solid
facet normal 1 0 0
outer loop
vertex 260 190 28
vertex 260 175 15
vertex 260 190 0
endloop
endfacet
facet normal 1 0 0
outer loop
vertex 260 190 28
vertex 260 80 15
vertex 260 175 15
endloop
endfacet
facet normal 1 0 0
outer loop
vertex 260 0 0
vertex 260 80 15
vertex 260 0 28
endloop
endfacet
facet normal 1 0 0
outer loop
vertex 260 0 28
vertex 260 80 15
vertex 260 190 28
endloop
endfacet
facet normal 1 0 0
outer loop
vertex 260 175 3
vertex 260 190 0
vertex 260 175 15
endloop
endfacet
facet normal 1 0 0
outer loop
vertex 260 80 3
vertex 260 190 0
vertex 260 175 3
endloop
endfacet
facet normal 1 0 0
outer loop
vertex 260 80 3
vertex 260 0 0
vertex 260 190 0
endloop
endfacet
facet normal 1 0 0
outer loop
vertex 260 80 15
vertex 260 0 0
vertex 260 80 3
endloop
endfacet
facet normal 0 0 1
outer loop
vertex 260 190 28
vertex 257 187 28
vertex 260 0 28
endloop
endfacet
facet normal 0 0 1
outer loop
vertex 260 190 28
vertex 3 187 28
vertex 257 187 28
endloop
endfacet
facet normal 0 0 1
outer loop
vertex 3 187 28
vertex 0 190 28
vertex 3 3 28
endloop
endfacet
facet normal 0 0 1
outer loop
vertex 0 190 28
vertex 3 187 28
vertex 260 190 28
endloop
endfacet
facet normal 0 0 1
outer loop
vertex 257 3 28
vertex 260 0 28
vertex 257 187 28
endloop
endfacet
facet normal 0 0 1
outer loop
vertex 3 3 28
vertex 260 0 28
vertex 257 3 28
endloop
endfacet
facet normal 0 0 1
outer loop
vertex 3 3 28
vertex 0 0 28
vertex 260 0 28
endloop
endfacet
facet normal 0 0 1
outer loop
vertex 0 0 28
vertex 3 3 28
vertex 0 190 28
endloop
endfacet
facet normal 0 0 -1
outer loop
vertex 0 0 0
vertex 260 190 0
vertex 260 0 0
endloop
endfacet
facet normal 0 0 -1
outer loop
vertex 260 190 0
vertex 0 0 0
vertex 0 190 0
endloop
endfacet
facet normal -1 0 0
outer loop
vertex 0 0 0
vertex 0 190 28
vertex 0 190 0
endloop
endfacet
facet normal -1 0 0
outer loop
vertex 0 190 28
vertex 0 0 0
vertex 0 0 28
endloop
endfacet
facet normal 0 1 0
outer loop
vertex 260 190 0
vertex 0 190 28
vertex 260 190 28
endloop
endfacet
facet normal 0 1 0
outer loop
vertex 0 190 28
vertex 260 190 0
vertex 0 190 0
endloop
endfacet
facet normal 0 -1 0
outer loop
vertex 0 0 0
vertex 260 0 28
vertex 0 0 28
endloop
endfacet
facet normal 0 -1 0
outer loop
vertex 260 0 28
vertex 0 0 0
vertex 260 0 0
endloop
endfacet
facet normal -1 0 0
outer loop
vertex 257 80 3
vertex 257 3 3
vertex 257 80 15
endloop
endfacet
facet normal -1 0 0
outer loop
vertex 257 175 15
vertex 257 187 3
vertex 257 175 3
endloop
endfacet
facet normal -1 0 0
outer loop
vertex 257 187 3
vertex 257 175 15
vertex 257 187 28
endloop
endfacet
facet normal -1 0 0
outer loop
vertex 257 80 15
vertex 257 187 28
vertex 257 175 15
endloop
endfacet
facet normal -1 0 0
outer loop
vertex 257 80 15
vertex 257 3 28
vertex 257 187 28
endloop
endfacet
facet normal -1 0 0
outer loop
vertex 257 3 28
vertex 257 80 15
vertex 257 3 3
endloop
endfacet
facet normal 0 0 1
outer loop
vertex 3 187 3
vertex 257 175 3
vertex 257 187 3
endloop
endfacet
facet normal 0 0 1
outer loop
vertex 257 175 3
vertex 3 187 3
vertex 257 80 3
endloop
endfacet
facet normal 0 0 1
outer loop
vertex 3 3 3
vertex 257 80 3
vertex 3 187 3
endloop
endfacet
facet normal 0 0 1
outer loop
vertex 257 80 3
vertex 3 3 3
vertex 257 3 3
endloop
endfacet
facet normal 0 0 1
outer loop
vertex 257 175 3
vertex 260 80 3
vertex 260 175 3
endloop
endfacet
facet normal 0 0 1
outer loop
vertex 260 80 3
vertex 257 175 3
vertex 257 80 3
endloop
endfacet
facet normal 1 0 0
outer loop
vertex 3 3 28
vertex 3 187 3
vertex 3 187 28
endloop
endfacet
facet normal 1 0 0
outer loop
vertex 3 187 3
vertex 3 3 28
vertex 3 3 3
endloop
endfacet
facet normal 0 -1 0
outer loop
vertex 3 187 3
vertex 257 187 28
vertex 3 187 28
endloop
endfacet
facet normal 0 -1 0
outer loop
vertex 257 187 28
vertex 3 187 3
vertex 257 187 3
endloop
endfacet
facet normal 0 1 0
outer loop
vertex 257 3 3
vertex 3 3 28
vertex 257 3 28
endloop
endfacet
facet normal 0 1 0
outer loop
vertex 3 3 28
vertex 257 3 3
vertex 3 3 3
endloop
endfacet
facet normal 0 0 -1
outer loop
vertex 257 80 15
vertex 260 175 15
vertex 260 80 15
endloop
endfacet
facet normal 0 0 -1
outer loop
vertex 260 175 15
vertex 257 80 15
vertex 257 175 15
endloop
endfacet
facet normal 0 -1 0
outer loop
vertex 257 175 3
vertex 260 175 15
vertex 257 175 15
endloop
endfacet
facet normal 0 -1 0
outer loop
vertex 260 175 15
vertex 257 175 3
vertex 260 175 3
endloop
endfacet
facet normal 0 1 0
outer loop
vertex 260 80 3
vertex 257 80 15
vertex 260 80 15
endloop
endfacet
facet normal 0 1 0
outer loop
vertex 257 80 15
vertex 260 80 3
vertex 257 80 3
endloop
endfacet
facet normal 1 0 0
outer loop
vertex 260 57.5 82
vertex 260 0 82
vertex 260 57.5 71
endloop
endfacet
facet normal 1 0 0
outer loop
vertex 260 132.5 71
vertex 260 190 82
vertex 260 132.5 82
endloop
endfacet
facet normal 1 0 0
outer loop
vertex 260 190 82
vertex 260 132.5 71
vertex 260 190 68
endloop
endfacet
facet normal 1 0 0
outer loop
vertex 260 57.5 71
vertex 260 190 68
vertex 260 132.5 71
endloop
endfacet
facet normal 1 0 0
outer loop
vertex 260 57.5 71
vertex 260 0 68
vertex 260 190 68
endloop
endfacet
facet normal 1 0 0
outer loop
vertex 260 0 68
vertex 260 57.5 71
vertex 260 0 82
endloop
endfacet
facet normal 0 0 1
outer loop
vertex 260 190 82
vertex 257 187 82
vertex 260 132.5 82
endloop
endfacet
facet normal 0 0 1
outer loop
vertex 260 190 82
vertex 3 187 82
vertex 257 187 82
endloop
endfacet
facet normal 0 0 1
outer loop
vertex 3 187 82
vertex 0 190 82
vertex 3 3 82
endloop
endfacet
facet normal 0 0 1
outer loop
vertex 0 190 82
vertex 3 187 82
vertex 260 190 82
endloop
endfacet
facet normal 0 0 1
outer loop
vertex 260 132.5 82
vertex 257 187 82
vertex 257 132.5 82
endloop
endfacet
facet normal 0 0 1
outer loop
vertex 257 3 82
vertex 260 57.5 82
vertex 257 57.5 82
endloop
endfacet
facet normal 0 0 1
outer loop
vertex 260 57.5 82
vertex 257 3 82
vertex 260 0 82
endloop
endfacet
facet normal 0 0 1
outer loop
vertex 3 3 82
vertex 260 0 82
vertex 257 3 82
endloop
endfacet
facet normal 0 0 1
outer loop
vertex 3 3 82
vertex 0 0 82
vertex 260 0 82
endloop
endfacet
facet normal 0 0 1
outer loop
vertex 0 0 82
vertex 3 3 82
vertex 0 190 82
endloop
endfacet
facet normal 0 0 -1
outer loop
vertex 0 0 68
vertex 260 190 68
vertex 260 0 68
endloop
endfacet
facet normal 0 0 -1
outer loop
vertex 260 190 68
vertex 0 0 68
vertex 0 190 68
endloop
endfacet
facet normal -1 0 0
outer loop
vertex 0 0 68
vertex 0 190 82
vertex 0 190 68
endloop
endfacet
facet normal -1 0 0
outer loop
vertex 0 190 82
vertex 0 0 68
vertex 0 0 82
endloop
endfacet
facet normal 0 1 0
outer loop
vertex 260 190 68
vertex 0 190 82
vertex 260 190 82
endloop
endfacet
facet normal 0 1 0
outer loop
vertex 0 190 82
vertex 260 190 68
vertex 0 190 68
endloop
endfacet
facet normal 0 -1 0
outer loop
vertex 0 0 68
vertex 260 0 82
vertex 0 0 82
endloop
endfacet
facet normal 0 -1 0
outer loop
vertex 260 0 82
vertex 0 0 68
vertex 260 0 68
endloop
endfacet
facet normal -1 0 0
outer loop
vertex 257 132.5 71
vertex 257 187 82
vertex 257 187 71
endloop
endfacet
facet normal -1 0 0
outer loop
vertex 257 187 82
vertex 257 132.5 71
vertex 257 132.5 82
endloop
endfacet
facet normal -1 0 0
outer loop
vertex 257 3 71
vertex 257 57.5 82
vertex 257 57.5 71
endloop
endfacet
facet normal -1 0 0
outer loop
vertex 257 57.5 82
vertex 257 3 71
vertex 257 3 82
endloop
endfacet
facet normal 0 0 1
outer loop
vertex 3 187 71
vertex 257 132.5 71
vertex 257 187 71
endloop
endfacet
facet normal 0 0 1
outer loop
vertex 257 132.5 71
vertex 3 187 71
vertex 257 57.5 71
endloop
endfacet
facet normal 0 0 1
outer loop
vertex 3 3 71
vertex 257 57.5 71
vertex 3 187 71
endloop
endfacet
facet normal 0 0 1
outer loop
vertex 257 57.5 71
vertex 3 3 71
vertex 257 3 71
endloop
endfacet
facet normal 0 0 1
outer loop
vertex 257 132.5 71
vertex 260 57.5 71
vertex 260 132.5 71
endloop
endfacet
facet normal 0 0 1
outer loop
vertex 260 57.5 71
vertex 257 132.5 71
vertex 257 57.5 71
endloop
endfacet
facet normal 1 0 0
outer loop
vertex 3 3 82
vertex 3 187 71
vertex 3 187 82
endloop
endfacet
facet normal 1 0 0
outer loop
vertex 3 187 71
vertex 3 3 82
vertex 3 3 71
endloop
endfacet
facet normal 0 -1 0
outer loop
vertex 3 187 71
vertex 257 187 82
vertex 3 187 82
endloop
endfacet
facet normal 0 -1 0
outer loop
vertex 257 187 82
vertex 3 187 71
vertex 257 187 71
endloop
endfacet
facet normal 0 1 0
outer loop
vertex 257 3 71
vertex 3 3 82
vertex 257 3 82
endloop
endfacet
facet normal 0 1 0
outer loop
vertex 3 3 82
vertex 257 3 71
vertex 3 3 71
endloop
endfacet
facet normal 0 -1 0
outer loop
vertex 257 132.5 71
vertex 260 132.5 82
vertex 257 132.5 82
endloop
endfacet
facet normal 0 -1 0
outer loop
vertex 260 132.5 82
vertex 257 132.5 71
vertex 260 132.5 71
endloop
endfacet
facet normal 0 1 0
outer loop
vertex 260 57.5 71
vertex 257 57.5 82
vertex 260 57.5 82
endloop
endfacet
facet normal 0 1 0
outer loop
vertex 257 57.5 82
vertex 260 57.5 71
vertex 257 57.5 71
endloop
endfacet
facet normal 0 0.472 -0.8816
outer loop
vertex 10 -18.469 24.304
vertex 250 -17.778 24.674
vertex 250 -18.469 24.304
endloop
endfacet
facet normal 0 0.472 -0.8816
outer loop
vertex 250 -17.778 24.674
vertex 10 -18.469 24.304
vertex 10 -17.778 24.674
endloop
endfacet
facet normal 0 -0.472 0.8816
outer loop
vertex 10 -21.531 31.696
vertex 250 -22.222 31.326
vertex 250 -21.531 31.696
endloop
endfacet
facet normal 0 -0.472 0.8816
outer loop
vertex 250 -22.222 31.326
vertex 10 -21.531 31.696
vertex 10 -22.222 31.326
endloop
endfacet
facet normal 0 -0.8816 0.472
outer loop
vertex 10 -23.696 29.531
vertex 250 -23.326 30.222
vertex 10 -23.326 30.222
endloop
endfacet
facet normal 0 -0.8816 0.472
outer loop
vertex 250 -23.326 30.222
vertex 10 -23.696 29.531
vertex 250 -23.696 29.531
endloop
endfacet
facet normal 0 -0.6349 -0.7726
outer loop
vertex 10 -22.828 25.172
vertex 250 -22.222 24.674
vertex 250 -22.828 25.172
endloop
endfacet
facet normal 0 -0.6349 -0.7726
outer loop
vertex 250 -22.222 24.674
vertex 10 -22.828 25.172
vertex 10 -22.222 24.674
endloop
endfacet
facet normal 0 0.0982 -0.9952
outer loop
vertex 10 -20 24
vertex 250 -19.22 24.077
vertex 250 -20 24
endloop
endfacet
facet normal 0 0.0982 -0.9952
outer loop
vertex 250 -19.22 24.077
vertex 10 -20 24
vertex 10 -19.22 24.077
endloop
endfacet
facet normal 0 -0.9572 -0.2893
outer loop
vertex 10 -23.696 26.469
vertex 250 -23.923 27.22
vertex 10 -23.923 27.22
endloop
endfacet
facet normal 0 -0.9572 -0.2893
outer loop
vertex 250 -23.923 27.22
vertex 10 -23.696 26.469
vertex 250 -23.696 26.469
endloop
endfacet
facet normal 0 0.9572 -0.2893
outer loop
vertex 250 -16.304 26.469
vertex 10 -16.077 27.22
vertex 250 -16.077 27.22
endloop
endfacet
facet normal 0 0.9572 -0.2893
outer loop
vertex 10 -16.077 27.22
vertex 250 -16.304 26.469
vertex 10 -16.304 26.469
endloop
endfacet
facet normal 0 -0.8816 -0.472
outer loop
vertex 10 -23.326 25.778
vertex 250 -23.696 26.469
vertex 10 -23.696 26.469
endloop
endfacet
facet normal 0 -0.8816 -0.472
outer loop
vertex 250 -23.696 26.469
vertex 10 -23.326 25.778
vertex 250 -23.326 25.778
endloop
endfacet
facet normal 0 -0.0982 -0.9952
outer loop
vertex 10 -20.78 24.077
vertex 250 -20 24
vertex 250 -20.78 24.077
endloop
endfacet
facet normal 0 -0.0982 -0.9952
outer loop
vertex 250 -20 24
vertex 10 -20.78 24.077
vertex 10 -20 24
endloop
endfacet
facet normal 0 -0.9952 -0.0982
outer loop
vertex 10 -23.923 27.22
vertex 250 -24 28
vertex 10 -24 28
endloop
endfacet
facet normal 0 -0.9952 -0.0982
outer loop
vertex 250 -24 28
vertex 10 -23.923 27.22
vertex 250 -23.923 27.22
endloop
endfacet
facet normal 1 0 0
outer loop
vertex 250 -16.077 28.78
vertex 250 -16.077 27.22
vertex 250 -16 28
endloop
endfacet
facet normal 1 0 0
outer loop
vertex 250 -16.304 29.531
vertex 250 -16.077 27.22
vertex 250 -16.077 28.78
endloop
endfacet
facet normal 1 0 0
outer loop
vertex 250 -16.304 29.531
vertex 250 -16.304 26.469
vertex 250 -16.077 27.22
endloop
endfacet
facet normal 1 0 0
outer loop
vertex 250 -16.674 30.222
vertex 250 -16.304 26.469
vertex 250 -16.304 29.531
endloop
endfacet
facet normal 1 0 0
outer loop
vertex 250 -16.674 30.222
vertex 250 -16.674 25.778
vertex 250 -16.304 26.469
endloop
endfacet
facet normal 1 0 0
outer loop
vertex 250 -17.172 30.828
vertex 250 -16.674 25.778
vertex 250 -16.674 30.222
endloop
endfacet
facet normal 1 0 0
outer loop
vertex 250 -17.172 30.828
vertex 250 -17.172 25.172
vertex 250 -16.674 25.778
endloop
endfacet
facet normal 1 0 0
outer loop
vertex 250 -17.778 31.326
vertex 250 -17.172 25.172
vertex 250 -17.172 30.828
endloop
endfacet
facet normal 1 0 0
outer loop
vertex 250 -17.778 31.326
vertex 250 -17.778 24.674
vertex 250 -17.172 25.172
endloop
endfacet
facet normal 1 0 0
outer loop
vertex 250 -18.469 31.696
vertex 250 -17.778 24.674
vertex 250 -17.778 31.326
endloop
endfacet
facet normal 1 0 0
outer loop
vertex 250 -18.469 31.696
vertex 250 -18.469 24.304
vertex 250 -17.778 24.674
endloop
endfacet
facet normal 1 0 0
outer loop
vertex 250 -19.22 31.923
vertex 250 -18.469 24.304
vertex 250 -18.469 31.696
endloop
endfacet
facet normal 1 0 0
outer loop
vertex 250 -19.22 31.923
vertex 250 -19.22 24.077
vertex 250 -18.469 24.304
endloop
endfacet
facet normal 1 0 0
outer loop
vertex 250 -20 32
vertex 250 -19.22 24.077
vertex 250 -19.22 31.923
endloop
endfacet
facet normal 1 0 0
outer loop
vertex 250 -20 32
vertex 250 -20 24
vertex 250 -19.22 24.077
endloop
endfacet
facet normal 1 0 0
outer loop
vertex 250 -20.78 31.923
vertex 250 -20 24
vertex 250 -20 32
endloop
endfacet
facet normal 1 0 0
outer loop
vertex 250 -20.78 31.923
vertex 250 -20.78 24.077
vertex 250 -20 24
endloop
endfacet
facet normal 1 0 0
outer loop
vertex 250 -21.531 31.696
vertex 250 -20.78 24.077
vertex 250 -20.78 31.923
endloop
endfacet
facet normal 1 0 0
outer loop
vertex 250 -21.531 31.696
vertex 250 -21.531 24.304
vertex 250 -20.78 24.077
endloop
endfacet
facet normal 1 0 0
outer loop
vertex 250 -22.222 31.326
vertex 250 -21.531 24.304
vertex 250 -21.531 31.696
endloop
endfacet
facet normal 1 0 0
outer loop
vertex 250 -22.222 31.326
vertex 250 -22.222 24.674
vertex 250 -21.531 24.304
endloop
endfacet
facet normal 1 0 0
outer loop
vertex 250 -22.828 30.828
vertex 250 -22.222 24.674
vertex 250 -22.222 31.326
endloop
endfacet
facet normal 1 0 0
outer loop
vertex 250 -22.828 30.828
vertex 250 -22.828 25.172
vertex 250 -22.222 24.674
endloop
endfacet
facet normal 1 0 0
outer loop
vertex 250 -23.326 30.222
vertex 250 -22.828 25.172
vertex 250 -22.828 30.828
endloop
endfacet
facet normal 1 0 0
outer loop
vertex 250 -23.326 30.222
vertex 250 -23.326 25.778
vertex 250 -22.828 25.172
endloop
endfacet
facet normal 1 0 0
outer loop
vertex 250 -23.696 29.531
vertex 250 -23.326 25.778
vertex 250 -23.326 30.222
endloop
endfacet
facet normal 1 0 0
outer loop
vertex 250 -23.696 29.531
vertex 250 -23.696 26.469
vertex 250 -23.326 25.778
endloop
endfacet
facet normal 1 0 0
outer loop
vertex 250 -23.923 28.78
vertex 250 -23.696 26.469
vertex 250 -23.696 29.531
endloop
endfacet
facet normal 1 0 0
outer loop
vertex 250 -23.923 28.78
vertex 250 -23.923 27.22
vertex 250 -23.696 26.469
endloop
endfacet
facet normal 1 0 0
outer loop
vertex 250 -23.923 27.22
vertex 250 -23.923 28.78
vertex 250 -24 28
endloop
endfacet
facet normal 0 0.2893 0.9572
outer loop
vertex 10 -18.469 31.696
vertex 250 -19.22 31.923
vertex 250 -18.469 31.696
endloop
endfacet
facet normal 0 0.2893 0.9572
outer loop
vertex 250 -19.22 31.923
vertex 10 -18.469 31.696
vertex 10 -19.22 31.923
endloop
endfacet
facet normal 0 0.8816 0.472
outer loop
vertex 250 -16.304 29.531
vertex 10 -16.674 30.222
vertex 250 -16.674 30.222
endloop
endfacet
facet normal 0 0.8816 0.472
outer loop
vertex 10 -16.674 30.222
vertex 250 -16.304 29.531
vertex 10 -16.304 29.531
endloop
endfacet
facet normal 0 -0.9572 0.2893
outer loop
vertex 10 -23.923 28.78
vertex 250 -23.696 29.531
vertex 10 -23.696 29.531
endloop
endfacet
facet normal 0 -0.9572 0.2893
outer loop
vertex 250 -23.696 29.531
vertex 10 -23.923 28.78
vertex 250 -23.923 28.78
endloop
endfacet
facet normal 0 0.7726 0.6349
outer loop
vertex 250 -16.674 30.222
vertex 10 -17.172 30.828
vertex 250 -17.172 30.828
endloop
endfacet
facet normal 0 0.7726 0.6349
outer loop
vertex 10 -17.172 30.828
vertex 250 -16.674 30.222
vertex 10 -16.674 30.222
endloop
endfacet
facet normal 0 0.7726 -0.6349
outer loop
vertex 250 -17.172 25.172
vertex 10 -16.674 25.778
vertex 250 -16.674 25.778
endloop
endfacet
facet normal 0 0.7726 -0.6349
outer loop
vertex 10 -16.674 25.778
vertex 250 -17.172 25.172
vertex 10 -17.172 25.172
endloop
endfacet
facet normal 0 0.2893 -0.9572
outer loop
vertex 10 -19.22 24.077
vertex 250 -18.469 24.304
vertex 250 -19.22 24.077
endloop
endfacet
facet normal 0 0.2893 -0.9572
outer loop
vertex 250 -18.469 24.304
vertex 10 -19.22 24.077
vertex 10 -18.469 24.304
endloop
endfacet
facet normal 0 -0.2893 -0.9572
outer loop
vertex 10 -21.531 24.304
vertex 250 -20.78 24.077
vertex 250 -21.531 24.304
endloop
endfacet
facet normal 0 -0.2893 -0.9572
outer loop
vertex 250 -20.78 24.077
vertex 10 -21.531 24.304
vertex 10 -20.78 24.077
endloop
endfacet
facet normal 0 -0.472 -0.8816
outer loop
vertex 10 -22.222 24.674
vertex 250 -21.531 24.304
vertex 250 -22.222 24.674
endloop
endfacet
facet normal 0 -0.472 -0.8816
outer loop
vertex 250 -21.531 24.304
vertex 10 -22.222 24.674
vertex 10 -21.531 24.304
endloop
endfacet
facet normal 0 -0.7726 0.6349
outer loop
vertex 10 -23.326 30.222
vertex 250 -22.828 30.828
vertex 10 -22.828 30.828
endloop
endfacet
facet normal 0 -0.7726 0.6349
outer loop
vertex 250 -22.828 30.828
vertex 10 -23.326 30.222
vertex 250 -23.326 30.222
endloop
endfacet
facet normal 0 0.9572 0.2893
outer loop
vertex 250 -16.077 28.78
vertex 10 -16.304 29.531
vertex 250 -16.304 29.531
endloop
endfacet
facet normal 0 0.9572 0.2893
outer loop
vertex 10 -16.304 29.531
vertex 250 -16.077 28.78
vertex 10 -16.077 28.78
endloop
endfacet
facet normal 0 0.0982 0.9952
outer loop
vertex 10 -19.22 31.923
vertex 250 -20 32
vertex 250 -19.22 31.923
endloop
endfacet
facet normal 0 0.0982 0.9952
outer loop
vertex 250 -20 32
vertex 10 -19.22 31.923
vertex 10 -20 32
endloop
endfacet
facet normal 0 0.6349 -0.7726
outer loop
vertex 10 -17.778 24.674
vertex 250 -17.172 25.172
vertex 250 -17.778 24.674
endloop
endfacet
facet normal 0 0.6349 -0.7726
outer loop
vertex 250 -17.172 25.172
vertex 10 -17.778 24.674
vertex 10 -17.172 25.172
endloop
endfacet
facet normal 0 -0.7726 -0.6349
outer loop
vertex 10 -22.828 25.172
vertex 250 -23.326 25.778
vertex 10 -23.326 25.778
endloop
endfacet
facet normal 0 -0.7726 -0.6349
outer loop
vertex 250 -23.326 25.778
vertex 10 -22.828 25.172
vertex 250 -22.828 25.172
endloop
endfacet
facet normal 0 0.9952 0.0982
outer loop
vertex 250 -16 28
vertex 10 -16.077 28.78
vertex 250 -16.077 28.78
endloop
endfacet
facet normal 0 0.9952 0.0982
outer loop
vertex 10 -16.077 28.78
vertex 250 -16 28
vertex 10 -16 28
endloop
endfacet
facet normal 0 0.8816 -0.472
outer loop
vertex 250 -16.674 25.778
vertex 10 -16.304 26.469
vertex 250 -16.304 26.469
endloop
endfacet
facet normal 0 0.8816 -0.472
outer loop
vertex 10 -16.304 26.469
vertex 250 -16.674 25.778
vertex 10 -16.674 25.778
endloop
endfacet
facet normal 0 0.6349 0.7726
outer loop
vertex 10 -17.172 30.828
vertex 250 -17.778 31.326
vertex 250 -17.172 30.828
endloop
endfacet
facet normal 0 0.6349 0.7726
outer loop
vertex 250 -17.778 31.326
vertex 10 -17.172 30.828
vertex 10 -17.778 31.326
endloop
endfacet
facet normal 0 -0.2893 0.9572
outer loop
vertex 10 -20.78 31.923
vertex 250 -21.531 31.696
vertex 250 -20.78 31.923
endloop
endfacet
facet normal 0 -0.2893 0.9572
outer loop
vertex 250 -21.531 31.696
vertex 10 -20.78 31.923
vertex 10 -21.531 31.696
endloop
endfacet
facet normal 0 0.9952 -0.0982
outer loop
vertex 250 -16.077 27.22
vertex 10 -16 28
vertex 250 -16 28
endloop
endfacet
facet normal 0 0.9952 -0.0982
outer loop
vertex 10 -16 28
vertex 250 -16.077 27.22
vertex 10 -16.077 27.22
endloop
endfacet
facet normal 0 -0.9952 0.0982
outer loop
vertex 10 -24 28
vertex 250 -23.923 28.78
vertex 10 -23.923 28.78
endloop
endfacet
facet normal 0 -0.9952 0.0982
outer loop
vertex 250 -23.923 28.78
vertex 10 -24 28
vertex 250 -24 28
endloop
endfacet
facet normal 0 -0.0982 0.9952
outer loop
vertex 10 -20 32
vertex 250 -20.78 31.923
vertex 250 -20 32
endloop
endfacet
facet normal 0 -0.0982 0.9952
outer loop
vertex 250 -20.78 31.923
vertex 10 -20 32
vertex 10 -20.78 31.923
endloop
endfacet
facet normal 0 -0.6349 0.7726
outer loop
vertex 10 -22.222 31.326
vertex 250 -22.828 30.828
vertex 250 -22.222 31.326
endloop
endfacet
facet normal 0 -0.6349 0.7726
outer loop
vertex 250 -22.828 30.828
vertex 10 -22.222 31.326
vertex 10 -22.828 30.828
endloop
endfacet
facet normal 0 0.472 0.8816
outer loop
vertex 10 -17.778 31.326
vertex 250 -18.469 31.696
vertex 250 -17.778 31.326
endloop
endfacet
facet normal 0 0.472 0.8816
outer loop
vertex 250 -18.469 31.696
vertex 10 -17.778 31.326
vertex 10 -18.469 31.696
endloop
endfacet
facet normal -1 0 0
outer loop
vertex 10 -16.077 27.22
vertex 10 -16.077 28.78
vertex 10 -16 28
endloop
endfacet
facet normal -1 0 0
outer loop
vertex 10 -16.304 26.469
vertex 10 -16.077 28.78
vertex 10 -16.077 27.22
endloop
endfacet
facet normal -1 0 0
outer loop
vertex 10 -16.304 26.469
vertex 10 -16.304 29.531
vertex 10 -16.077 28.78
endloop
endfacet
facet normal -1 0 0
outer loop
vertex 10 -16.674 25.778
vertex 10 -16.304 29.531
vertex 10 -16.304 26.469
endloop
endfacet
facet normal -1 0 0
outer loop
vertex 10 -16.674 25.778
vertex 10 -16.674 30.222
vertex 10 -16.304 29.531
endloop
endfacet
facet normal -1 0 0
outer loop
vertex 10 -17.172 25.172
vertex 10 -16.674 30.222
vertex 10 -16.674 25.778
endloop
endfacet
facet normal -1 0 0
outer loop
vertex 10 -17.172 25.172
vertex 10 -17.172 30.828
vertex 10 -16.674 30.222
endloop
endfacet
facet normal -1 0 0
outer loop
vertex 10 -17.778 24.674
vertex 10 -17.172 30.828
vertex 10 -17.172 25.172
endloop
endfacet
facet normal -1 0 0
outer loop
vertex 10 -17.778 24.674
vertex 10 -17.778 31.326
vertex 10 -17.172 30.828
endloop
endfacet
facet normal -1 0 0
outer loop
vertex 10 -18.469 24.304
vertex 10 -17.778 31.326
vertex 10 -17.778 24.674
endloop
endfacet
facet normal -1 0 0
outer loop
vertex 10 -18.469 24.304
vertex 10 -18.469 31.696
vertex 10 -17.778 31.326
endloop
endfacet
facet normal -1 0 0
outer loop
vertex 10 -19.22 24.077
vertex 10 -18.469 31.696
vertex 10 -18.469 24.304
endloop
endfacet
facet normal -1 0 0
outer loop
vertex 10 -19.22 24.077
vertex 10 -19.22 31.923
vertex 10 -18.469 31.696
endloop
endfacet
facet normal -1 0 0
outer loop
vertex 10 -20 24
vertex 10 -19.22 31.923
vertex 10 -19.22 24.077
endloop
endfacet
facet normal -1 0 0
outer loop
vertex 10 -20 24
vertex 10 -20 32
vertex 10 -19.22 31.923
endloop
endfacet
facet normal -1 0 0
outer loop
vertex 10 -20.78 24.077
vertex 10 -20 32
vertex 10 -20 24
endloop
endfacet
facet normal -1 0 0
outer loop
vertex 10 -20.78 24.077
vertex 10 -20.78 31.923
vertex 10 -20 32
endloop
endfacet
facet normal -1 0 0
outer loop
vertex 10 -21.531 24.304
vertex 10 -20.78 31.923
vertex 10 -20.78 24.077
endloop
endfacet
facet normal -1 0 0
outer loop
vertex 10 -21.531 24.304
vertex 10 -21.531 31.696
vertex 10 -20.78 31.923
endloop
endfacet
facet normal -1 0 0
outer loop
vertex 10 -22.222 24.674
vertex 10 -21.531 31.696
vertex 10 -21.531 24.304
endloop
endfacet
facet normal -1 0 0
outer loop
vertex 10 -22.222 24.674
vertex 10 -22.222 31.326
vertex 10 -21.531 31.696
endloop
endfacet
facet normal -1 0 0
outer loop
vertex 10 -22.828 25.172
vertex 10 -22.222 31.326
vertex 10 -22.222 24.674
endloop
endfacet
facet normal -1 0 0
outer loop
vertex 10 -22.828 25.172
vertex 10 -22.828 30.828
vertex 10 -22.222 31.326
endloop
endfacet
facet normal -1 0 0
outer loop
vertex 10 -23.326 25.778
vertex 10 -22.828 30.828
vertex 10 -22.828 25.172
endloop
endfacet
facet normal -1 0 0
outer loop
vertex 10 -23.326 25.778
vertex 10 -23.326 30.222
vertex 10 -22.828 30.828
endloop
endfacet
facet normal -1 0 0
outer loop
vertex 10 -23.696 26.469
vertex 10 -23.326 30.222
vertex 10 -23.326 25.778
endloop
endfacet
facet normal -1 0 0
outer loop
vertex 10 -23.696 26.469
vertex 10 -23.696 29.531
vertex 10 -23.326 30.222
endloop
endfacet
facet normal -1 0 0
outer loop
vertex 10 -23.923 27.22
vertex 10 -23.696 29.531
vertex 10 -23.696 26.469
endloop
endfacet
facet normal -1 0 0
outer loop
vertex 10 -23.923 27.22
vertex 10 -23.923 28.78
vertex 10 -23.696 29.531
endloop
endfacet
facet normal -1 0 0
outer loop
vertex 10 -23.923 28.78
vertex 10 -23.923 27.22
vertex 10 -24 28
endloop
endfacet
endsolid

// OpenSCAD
// Cyberdeck Fieldkit - Clamshell Case
// CC BY-NC-SA 4.0 - Neil Manfred
// Parametric skeleton: adjust dimensions to match final part sourcing,
// then re-export STL/3MF per half before printing.

/* ---------- Global parameters ---------- */
wall_t          = 3;      // shell wall thickness, mm
tolerance       = 0.3;    // fit clearance, mm

/* ---------- Lower half (base) ---------- */
base_w          = 260;
base_d          = 190;
base_h          = 28;

nuc_w           = 115;    // confirmed: GMKtec NucBox G3 barebone (115x108x44mm)
nuc_d           = 108;
nuc_h           = 44;

keyboard_w      = 245;    // 60-65% board footprint
keyboard_d      = 95;
keyboard_h      = 12;

module_bay_w    = 90;     // TODO: resize to LilyGO T-Embed CC1101 footprint once in hand
module_bay_d    = 60;
module_bay_h    = 18;

/* ---------- Upper half (lid) ---------- */
lid_w           = base_w;
lid_d           = base_d;
lid_h           = 14;

screen_w        = 118;    // per-panel, 5.5"-7" class - confirm against sourced panel
screen_d         = 75;
screen_gap      = 8;      // gap between the two panels

/* ---------- Hinge ---------- */
hinge_len       = base_w - 20;
hinge_dia       = 8;

/* ================= Modules ================= */

module shell(w, d, h, t = wall_t) {
    difference() {
        cube([w, d, h]);
        translate([t, t, t])
            cube([w - 2*t, d - 2*t, h]);
    }
}

module lower_half() {
    difference() {
        shell(base_w, base_d, base_h);

        // NUC bay
        translate([15, 15, wall_t])
            cube([nuc_w + tolerance, nuc_d + tolerance, nuc_h]);

        // Keyboard bay
        translate([15, base_d - keyboard_d - 15, wall_t])
            cube([keyboard_w, keyboard_d, keyboard_h]);

        // Embedded security module bay - front edge for sensor cutouts
        translate([base_w - module_bay_w - 15, 15, wall_t])
            cube([module_bay_w, module_bay_d, module_bay_h]);
    }
}

module upper_half() {
    difference() {
        shell(lid_w, lid_d, lid_h);

        // Screen 1
        translate([20, (lid_d - screen_d)/2, wall_t])
            cube([screen_w, screen_d, lid_h]);

        // Screen 2
        translate([20 + screen_w + screen_gap, (lid_d - screen_d)/2, wall_t])
            cube([screen_w, screen_d, lid_h]);
    }
}

module hinge() {
    translate([(base_w - hinge_len)/2, 0, 0])
        rotate([0, 90, 0])
            cylinder(h = hinge_len, d = hinge_dia, $fn = 32);
}

/* ================= Layout for preview ================= */
lower_half();
translate([0, 0, base_h + 40]) upper_half();
translate([0, -20, base_h]) color("gray") hinge();
